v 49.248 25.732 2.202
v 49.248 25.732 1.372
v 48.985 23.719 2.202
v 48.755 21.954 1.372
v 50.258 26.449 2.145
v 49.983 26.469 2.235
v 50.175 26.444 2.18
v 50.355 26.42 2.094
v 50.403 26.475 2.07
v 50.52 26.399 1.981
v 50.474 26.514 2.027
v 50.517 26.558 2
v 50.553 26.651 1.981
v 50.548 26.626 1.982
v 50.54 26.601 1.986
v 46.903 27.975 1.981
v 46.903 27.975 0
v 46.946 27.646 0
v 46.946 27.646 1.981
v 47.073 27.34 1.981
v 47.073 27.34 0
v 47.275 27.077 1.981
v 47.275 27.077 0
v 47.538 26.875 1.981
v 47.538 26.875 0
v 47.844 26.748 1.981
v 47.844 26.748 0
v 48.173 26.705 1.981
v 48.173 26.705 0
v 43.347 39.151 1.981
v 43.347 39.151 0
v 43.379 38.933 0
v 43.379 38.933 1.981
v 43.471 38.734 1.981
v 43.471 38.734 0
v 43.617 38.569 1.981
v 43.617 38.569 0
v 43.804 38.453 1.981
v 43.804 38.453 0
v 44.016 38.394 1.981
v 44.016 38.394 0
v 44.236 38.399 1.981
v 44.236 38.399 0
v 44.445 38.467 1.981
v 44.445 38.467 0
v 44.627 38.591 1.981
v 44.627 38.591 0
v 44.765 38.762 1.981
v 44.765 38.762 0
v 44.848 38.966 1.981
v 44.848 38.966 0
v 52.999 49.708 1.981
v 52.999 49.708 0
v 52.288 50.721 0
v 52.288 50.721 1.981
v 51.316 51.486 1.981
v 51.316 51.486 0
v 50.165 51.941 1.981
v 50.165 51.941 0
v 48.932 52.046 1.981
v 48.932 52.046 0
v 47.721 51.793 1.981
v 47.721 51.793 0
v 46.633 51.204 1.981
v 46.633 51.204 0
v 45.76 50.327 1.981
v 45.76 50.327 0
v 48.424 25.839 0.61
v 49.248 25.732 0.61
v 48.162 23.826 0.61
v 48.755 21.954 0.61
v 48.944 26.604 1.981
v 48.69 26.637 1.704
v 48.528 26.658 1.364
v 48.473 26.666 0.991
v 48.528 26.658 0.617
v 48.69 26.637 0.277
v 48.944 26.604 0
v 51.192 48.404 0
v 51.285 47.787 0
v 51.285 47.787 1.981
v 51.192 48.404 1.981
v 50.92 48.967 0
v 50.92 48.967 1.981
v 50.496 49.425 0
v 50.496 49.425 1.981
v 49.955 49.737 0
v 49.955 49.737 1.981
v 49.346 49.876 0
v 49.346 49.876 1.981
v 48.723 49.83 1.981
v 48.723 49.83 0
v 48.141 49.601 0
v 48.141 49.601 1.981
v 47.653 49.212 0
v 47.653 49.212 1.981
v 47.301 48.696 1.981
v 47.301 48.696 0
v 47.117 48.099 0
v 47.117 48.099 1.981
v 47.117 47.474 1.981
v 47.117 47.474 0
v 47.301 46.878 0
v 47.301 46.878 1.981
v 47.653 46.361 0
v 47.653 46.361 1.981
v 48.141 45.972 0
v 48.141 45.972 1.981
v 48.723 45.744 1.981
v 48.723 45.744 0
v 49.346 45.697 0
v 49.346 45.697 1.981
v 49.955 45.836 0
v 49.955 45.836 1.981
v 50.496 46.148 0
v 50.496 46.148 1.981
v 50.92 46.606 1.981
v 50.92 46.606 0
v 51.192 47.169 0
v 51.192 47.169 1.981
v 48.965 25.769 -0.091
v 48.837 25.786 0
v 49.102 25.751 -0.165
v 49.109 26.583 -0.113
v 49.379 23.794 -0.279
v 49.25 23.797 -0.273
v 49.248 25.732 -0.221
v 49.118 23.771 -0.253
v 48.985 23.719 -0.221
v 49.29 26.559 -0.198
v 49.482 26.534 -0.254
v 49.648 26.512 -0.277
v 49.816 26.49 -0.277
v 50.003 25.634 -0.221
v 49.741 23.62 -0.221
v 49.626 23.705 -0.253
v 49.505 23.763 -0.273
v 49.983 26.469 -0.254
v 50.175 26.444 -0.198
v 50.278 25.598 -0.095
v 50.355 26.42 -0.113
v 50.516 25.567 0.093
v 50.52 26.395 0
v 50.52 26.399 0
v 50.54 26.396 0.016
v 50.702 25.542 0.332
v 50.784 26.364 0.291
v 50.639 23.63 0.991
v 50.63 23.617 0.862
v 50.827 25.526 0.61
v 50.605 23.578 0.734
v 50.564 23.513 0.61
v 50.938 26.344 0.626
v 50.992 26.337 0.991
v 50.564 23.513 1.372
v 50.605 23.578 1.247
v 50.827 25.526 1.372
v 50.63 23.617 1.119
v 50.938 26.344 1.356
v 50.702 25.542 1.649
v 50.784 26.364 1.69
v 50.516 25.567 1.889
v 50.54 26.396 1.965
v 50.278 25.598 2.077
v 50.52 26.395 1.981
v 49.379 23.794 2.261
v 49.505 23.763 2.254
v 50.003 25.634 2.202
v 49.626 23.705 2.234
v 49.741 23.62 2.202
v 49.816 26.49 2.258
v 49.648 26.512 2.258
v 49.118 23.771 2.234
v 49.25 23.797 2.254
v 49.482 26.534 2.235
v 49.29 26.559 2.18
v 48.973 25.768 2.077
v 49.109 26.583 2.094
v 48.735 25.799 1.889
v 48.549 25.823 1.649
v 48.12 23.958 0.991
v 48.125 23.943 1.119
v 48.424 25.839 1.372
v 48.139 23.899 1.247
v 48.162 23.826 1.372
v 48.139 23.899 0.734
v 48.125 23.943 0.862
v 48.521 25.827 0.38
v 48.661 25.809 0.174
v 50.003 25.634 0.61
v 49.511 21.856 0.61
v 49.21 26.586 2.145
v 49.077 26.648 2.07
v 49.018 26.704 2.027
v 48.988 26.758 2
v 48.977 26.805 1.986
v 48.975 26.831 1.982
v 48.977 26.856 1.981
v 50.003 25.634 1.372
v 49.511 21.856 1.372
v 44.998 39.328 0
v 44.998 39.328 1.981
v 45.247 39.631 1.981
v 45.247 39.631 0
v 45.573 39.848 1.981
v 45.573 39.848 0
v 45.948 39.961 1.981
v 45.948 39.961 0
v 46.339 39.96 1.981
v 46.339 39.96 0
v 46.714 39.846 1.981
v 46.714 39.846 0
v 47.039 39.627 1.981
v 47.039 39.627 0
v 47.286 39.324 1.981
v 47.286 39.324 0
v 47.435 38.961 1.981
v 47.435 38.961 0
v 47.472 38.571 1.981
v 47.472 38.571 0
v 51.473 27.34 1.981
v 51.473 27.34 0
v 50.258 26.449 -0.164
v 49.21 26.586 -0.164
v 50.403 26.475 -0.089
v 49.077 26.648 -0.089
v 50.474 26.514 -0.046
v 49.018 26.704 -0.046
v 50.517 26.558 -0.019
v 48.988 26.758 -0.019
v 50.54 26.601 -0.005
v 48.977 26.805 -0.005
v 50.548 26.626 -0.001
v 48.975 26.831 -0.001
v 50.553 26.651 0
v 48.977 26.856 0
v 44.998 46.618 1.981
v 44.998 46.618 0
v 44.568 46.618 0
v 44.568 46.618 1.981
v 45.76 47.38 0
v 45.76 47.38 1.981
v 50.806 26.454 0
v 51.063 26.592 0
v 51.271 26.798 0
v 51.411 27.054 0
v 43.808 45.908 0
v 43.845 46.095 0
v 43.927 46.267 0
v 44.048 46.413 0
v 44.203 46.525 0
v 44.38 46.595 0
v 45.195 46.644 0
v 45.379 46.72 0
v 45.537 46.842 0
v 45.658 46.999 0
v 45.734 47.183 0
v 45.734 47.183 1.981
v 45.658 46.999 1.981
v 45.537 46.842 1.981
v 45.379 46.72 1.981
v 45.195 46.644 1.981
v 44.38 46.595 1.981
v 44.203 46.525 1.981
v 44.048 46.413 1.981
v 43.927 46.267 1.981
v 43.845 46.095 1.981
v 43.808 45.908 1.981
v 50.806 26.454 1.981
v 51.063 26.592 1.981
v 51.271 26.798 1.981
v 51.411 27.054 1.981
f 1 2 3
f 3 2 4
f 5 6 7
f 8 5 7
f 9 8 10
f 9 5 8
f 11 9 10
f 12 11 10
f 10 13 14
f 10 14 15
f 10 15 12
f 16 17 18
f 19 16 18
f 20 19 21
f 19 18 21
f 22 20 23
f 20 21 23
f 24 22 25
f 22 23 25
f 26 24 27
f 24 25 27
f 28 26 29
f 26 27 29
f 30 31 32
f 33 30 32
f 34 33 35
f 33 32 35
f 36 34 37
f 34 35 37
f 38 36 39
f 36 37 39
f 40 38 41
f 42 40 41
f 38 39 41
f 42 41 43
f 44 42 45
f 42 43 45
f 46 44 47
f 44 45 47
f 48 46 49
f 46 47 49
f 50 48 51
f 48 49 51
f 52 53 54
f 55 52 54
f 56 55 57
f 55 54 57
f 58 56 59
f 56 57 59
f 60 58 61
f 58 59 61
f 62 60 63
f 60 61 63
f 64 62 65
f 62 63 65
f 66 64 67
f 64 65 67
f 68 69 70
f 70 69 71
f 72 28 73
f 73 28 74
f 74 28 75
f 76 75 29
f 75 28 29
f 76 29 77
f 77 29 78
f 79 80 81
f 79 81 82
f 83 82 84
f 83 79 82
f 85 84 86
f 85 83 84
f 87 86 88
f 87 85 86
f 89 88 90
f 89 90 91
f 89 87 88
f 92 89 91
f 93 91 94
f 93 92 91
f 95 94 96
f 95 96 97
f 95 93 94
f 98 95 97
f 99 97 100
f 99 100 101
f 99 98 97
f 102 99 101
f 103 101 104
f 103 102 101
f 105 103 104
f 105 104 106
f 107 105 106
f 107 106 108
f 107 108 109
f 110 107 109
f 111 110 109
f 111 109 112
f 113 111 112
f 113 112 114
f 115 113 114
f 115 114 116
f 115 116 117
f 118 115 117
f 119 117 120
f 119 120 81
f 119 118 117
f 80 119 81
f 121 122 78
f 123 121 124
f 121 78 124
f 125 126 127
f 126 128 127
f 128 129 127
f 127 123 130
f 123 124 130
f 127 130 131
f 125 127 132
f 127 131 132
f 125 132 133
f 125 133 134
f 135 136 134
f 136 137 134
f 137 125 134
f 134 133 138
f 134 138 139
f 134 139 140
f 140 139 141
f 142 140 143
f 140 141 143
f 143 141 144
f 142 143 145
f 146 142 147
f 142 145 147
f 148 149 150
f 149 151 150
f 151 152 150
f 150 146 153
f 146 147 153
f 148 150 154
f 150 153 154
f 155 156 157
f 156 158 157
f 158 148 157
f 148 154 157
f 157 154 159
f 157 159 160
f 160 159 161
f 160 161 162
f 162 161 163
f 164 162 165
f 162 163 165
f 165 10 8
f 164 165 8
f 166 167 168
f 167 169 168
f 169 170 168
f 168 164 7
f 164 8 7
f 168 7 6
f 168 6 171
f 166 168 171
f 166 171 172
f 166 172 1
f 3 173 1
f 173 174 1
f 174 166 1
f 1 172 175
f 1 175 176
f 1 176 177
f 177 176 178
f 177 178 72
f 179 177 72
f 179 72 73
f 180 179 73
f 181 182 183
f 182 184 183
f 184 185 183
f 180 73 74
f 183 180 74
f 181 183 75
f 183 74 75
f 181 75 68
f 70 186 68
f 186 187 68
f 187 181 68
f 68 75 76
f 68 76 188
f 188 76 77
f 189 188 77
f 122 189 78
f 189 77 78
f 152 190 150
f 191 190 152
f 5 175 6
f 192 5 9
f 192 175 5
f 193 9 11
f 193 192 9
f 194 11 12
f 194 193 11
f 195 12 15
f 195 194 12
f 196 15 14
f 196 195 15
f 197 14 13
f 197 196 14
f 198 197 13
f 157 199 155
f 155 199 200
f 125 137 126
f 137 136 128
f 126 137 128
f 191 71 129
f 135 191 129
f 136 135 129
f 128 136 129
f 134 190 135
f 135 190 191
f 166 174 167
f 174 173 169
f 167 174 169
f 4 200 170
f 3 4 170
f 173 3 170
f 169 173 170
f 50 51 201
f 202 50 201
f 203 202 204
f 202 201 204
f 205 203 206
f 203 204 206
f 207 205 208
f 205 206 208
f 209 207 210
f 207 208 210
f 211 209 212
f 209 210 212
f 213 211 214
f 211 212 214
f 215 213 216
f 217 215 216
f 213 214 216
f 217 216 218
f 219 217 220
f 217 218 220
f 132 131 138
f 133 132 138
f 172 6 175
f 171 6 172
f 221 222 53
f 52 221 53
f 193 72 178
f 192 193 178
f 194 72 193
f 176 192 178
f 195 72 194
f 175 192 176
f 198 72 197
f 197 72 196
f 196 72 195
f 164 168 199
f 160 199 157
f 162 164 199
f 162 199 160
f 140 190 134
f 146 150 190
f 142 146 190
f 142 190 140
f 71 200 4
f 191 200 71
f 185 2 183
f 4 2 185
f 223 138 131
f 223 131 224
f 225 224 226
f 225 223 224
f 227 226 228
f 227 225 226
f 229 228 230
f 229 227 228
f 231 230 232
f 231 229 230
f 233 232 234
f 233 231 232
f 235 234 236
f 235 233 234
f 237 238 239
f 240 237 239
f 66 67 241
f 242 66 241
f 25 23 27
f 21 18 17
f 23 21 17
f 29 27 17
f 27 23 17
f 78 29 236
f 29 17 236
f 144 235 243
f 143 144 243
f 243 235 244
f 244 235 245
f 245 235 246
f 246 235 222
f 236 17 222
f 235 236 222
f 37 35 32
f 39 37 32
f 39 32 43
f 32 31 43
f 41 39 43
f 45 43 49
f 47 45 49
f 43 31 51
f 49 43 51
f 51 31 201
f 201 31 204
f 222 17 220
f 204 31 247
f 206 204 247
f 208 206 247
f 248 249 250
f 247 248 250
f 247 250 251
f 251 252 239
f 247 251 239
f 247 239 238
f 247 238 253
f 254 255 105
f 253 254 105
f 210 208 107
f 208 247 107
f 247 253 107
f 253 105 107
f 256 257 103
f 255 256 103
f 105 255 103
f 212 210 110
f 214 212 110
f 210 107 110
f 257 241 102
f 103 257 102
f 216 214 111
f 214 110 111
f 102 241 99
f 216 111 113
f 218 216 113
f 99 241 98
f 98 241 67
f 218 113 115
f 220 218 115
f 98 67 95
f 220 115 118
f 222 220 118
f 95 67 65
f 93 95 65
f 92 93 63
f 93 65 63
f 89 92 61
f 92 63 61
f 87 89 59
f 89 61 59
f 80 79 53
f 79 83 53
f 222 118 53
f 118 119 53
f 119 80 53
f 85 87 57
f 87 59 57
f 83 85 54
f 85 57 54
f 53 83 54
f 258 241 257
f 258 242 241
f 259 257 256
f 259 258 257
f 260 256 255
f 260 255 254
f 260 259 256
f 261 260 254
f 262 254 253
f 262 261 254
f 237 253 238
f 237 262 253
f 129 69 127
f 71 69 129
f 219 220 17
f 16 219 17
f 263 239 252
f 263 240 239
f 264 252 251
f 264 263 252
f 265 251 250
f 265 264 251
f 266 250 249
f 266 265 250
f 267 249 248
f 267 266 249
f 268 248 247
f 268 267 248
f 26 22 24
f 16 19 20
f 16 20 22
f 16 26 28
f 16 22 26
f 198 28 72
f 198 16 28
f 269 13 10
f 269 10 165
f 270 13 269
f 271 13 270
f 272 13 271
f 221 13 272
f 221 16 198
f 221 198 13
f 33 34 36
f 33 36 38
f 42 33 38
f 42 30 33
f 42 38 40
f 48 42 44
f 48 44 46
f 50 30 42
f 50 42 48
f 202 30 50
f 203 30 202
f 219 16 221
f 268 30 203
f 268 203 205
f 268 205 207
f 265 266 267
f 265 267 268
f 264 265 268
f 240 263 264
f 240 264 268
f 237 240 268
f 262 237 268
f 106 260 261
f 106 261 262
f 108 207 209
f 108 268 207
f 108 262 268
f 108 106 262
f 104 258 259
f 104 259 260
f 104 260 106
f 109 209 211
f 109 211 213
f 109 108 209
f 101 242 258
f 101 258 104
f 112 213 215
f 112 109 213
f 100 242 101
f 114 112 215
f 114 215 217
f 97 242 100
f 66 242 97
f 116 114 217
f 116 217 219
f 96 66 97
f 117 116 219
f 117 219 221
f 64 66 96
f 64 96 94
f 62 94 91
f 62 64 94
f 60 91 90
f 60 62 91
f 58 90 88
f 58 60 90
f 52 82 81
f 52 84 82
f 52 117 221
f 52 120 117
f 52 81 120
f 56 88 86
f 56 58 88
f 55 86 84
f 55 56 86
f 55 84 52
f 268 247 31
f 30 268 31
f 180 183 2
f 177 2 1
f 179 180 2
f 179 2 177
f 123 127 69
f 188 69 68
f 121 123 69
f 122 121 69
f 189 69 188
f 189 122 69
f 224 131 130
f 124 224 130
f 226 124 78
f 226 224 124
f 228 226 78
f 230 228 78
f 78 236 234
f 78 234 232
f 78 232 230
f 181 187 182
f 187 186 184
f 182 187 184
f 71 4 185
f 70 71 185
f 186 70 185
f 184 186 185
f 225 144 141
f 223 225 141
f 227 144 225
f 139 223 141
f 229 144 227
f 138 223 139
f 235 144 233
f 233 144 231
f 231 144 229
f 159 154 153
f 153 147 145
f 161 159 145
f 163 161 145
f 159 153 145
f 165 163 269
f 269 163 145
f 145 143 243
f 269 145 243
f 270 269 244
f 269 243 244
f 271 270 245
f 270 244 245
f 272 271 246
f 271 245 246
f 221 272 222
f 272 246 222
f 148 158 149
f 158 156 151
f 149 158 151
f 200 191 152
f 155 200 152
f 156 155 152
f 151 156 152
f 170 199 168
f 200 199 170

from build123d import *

# Parameters (mm, degrees)
SKETCH1_R           = 2.0955
BOSS_EXTRUDE1_DEPTH = 1.9812
FILLET1_R           = 0.762
SKETCH3_R           = 1.27
BOSS_EXTRUDE2_DEPTH = 4.6355
SKETCH5_W           = 0.830502785
SKETCH5_H           = 0.830502786
CUT_EXTRUDE1_DEPTH  = 3.81
CUT_EXTRUDE2_DEPTH  = 3.81
CIRPATTERN1_COUNT   = 4
FILLET3_R           = 0.254


with BuildPart() as part:
    # Sketch1 → Boss-Extrude1 (new body)
    with BuildSketch(Plane.XY):
        with BuildLine():
            Line((45.760103821, 50.326590864), (45.760103821, 46.618317867))
            Line((45.760103821, 46.618317867), (43.856665355, 46.618317867))
            Line((43.856665355, 46.618317867), (43.347103821, 39.150717867))
            ThreePointArc((43.347103821, 39.150717867), (44.016000174, 38.394427109), (44.848352407, 38.965905721))
            ThreePointArc((44.848352407, 38.965905721), (46.339305619, 39.960432804), (47.471727095, 38.571315385))
            Line((47.471727095, 38.571315385), (46.903103821, 27.974717867))
            ThreePointArc((46.903103821, 27.974717867), (47.275078209, 27.076692255), (48.173103821, 26.704717867))
            Line((48.173103821, 26.704717867), (50.12121108, 26.450717867))
            ThreePointArc((50.12121108, 26.450717867), (51.01744047, 26.560052876), (51.472746702, 27.339717867))
            Line((51.472746702, 27.339717867), (52.999103821, 49.708408747))
            ThreePointArc((52.999103821, 49.708408747), (49.552184435, 52.0384432), (45.760103821, 50.326590864))
        make_face()
        with Locations((49.189103821, 47.786717867)):
            Circle(SKETCH1_R, mode=Mode.SUBTRACT)
    extrude(amount=BOSS_EXTRUDE1_DEPTH)

    # Fillet1
    fillet1_edges = [part.edges().sort_by_distance(p)[0] for p in [
        (43.856665355, 46.618317867, 0.9906),
        (45.760103821, 46.618317867, 0.9906),
    ]]
    fillet(fillet1_edges, radius=FILLET1_R)

    # Sketch3 → Boss-Extrude2 (add)
    with BuildSketch(Plane(origin=(4.228879683, 32.434296092, 0), x_dir=(0.9916069999104432, -0.12928866047960397, 0), z_dir=(-0.12928866047960397, -0.9916069999104432, 0))):
        with Locations(Location((45.888507166, 0.9906, 0), (0, 0, 231.260575402))):
            Circle(SKETCH3_R)
    extrude(amount=BOSS_EXTRUDE2_DEPTH)

    # Sketch5 → Cut-Extrude1 (cut)
    with BuildSketch(Plane(origin=(3.629562097, 27.837701844, 0), x_dir=(0.9916069999104432, -0.129288660479604, 0), z_dir=(-0.129288660479604, -0.9916069999104432, 0))):
        with Locations((46.684758559, 1.786851393)):
            Rectangle(SKETCH5_W, SKETCH5_H)
    cut_extrude1 = extrude(amount=-CUT_EXTRUDE1_DEPTH, mode=Mode.SUBTRACT)

    # Sketch6 → Cut-Extrude2 (cut)
    with BuildSketch(Plane(origin=(45.881167188, -5.982122602, 0), x_dir=(0, 0, -1), z_dir=(0.9916069999104432, -0.129288660479604, 0))):
        Polygon((-1.3716, 28.073321232), (-2.2606, 29.978321232), (-2.2606, 28.073321232), align=None)
    cut_extrude2 = extrude(amount=-CUT_EXTRUDE2_DEPTH, mode=Mode.SUBTRACT)

    # CirPattern1: Cut-Extrude1, Cut-Extrude2 ×4 about axis
    cirpattern1_axis = Axis((45.503364921, -5.932863623, 0.9906), (0.1292886604796056, 0.991606999910443, 0))
    add([cut_extrude1.rotate(cirpattern1_axis, i * 360 / CIRPATTERN1_COUNT) for i in range(1, CIRPATTERN1_COUNT)], mode=Mode.SUBTRACT)
    add([cut_extrude2.rotate(cirpattern1_axis, i * 360 / CIRPATTERN1_COUNT) for i in range(1, CIRPATTERN1_COUNT)], mode=Mode.SUBTRACT)

    # Fillet3
    # the kernel refuses this fillet: 0.254 mm, written as the material it adds along each edge
    with BuildSketch(Plane(origin=(48.314504429, 26.686281636, 1.9812), x_dir=(0.1292886604796056, 0.9916069999104429, 0), z_dir=(0.991606999910443, -0.1292886604796056, -1.1175710787249272e-14))) as fillet3_piece_1_section:
        with BuildLine():
            CenterArc((FILLET3_R, FILLET3_R), FILLET3_R, 180, 90)
            Line((0, FILLET3_R), (0, 0))
            Line((0, 0), (FILLET3_R, 0))
        make_face()
    fillet3_piece_1 = extrude(amount=2.859479965, mode=Mode.PRIVATE)
    fillet3_piece_1 = fillet3_piece_1 & Plane(origin=(49.739170081, 26.554548895, 0.9906), x_dir=(-0.6205273463723372, 0.08090619510621488, -0.7799999999984234), z_dir=(0.12928866047960397, 0.9916069999104432, 0)) * Cylinder(1.27, 7, mode=Mode.PRIVATE)
    add(fillet3_piece_1)
    with BuildSketch(Plane(origin=(51.149984779, 26.316583302, 0), x_dir=(0.12928866047960436, 0.9916069999104431, 0), z_dir=(-0.9916069999104432, 0.12928866047960438, 1.2608297213769615e-12))) as fillet3_piece_2_section:
        with BuildLine():
            CenterArc((FILLET3_R, FILLET3_R), FILLET3_R, 180, 90)
            Line((0, FILLET3_R), (0, 0))
            Line((0, 0), (FILLET3_R, 0))
        make_face()
    fillet3_piece_2 = extrude(amount=2.859479965, mode=Mode.PRIVATE)
    fillet3_piece_2 = fillet3_piece_2 & Plane(origin=(49.73917008, 26.554548887, 0.9906), x_dir=(-0.6205273463723372, 0.08090619510621488, -0.7799999999984234), z_dir=(0.12928866047960397, 0.9916069999104432, 0)) * Cylinder(1.27, 7, mode=Mode.PRIVATE)
    add(fillet3_piece_2)


solid = part.part
